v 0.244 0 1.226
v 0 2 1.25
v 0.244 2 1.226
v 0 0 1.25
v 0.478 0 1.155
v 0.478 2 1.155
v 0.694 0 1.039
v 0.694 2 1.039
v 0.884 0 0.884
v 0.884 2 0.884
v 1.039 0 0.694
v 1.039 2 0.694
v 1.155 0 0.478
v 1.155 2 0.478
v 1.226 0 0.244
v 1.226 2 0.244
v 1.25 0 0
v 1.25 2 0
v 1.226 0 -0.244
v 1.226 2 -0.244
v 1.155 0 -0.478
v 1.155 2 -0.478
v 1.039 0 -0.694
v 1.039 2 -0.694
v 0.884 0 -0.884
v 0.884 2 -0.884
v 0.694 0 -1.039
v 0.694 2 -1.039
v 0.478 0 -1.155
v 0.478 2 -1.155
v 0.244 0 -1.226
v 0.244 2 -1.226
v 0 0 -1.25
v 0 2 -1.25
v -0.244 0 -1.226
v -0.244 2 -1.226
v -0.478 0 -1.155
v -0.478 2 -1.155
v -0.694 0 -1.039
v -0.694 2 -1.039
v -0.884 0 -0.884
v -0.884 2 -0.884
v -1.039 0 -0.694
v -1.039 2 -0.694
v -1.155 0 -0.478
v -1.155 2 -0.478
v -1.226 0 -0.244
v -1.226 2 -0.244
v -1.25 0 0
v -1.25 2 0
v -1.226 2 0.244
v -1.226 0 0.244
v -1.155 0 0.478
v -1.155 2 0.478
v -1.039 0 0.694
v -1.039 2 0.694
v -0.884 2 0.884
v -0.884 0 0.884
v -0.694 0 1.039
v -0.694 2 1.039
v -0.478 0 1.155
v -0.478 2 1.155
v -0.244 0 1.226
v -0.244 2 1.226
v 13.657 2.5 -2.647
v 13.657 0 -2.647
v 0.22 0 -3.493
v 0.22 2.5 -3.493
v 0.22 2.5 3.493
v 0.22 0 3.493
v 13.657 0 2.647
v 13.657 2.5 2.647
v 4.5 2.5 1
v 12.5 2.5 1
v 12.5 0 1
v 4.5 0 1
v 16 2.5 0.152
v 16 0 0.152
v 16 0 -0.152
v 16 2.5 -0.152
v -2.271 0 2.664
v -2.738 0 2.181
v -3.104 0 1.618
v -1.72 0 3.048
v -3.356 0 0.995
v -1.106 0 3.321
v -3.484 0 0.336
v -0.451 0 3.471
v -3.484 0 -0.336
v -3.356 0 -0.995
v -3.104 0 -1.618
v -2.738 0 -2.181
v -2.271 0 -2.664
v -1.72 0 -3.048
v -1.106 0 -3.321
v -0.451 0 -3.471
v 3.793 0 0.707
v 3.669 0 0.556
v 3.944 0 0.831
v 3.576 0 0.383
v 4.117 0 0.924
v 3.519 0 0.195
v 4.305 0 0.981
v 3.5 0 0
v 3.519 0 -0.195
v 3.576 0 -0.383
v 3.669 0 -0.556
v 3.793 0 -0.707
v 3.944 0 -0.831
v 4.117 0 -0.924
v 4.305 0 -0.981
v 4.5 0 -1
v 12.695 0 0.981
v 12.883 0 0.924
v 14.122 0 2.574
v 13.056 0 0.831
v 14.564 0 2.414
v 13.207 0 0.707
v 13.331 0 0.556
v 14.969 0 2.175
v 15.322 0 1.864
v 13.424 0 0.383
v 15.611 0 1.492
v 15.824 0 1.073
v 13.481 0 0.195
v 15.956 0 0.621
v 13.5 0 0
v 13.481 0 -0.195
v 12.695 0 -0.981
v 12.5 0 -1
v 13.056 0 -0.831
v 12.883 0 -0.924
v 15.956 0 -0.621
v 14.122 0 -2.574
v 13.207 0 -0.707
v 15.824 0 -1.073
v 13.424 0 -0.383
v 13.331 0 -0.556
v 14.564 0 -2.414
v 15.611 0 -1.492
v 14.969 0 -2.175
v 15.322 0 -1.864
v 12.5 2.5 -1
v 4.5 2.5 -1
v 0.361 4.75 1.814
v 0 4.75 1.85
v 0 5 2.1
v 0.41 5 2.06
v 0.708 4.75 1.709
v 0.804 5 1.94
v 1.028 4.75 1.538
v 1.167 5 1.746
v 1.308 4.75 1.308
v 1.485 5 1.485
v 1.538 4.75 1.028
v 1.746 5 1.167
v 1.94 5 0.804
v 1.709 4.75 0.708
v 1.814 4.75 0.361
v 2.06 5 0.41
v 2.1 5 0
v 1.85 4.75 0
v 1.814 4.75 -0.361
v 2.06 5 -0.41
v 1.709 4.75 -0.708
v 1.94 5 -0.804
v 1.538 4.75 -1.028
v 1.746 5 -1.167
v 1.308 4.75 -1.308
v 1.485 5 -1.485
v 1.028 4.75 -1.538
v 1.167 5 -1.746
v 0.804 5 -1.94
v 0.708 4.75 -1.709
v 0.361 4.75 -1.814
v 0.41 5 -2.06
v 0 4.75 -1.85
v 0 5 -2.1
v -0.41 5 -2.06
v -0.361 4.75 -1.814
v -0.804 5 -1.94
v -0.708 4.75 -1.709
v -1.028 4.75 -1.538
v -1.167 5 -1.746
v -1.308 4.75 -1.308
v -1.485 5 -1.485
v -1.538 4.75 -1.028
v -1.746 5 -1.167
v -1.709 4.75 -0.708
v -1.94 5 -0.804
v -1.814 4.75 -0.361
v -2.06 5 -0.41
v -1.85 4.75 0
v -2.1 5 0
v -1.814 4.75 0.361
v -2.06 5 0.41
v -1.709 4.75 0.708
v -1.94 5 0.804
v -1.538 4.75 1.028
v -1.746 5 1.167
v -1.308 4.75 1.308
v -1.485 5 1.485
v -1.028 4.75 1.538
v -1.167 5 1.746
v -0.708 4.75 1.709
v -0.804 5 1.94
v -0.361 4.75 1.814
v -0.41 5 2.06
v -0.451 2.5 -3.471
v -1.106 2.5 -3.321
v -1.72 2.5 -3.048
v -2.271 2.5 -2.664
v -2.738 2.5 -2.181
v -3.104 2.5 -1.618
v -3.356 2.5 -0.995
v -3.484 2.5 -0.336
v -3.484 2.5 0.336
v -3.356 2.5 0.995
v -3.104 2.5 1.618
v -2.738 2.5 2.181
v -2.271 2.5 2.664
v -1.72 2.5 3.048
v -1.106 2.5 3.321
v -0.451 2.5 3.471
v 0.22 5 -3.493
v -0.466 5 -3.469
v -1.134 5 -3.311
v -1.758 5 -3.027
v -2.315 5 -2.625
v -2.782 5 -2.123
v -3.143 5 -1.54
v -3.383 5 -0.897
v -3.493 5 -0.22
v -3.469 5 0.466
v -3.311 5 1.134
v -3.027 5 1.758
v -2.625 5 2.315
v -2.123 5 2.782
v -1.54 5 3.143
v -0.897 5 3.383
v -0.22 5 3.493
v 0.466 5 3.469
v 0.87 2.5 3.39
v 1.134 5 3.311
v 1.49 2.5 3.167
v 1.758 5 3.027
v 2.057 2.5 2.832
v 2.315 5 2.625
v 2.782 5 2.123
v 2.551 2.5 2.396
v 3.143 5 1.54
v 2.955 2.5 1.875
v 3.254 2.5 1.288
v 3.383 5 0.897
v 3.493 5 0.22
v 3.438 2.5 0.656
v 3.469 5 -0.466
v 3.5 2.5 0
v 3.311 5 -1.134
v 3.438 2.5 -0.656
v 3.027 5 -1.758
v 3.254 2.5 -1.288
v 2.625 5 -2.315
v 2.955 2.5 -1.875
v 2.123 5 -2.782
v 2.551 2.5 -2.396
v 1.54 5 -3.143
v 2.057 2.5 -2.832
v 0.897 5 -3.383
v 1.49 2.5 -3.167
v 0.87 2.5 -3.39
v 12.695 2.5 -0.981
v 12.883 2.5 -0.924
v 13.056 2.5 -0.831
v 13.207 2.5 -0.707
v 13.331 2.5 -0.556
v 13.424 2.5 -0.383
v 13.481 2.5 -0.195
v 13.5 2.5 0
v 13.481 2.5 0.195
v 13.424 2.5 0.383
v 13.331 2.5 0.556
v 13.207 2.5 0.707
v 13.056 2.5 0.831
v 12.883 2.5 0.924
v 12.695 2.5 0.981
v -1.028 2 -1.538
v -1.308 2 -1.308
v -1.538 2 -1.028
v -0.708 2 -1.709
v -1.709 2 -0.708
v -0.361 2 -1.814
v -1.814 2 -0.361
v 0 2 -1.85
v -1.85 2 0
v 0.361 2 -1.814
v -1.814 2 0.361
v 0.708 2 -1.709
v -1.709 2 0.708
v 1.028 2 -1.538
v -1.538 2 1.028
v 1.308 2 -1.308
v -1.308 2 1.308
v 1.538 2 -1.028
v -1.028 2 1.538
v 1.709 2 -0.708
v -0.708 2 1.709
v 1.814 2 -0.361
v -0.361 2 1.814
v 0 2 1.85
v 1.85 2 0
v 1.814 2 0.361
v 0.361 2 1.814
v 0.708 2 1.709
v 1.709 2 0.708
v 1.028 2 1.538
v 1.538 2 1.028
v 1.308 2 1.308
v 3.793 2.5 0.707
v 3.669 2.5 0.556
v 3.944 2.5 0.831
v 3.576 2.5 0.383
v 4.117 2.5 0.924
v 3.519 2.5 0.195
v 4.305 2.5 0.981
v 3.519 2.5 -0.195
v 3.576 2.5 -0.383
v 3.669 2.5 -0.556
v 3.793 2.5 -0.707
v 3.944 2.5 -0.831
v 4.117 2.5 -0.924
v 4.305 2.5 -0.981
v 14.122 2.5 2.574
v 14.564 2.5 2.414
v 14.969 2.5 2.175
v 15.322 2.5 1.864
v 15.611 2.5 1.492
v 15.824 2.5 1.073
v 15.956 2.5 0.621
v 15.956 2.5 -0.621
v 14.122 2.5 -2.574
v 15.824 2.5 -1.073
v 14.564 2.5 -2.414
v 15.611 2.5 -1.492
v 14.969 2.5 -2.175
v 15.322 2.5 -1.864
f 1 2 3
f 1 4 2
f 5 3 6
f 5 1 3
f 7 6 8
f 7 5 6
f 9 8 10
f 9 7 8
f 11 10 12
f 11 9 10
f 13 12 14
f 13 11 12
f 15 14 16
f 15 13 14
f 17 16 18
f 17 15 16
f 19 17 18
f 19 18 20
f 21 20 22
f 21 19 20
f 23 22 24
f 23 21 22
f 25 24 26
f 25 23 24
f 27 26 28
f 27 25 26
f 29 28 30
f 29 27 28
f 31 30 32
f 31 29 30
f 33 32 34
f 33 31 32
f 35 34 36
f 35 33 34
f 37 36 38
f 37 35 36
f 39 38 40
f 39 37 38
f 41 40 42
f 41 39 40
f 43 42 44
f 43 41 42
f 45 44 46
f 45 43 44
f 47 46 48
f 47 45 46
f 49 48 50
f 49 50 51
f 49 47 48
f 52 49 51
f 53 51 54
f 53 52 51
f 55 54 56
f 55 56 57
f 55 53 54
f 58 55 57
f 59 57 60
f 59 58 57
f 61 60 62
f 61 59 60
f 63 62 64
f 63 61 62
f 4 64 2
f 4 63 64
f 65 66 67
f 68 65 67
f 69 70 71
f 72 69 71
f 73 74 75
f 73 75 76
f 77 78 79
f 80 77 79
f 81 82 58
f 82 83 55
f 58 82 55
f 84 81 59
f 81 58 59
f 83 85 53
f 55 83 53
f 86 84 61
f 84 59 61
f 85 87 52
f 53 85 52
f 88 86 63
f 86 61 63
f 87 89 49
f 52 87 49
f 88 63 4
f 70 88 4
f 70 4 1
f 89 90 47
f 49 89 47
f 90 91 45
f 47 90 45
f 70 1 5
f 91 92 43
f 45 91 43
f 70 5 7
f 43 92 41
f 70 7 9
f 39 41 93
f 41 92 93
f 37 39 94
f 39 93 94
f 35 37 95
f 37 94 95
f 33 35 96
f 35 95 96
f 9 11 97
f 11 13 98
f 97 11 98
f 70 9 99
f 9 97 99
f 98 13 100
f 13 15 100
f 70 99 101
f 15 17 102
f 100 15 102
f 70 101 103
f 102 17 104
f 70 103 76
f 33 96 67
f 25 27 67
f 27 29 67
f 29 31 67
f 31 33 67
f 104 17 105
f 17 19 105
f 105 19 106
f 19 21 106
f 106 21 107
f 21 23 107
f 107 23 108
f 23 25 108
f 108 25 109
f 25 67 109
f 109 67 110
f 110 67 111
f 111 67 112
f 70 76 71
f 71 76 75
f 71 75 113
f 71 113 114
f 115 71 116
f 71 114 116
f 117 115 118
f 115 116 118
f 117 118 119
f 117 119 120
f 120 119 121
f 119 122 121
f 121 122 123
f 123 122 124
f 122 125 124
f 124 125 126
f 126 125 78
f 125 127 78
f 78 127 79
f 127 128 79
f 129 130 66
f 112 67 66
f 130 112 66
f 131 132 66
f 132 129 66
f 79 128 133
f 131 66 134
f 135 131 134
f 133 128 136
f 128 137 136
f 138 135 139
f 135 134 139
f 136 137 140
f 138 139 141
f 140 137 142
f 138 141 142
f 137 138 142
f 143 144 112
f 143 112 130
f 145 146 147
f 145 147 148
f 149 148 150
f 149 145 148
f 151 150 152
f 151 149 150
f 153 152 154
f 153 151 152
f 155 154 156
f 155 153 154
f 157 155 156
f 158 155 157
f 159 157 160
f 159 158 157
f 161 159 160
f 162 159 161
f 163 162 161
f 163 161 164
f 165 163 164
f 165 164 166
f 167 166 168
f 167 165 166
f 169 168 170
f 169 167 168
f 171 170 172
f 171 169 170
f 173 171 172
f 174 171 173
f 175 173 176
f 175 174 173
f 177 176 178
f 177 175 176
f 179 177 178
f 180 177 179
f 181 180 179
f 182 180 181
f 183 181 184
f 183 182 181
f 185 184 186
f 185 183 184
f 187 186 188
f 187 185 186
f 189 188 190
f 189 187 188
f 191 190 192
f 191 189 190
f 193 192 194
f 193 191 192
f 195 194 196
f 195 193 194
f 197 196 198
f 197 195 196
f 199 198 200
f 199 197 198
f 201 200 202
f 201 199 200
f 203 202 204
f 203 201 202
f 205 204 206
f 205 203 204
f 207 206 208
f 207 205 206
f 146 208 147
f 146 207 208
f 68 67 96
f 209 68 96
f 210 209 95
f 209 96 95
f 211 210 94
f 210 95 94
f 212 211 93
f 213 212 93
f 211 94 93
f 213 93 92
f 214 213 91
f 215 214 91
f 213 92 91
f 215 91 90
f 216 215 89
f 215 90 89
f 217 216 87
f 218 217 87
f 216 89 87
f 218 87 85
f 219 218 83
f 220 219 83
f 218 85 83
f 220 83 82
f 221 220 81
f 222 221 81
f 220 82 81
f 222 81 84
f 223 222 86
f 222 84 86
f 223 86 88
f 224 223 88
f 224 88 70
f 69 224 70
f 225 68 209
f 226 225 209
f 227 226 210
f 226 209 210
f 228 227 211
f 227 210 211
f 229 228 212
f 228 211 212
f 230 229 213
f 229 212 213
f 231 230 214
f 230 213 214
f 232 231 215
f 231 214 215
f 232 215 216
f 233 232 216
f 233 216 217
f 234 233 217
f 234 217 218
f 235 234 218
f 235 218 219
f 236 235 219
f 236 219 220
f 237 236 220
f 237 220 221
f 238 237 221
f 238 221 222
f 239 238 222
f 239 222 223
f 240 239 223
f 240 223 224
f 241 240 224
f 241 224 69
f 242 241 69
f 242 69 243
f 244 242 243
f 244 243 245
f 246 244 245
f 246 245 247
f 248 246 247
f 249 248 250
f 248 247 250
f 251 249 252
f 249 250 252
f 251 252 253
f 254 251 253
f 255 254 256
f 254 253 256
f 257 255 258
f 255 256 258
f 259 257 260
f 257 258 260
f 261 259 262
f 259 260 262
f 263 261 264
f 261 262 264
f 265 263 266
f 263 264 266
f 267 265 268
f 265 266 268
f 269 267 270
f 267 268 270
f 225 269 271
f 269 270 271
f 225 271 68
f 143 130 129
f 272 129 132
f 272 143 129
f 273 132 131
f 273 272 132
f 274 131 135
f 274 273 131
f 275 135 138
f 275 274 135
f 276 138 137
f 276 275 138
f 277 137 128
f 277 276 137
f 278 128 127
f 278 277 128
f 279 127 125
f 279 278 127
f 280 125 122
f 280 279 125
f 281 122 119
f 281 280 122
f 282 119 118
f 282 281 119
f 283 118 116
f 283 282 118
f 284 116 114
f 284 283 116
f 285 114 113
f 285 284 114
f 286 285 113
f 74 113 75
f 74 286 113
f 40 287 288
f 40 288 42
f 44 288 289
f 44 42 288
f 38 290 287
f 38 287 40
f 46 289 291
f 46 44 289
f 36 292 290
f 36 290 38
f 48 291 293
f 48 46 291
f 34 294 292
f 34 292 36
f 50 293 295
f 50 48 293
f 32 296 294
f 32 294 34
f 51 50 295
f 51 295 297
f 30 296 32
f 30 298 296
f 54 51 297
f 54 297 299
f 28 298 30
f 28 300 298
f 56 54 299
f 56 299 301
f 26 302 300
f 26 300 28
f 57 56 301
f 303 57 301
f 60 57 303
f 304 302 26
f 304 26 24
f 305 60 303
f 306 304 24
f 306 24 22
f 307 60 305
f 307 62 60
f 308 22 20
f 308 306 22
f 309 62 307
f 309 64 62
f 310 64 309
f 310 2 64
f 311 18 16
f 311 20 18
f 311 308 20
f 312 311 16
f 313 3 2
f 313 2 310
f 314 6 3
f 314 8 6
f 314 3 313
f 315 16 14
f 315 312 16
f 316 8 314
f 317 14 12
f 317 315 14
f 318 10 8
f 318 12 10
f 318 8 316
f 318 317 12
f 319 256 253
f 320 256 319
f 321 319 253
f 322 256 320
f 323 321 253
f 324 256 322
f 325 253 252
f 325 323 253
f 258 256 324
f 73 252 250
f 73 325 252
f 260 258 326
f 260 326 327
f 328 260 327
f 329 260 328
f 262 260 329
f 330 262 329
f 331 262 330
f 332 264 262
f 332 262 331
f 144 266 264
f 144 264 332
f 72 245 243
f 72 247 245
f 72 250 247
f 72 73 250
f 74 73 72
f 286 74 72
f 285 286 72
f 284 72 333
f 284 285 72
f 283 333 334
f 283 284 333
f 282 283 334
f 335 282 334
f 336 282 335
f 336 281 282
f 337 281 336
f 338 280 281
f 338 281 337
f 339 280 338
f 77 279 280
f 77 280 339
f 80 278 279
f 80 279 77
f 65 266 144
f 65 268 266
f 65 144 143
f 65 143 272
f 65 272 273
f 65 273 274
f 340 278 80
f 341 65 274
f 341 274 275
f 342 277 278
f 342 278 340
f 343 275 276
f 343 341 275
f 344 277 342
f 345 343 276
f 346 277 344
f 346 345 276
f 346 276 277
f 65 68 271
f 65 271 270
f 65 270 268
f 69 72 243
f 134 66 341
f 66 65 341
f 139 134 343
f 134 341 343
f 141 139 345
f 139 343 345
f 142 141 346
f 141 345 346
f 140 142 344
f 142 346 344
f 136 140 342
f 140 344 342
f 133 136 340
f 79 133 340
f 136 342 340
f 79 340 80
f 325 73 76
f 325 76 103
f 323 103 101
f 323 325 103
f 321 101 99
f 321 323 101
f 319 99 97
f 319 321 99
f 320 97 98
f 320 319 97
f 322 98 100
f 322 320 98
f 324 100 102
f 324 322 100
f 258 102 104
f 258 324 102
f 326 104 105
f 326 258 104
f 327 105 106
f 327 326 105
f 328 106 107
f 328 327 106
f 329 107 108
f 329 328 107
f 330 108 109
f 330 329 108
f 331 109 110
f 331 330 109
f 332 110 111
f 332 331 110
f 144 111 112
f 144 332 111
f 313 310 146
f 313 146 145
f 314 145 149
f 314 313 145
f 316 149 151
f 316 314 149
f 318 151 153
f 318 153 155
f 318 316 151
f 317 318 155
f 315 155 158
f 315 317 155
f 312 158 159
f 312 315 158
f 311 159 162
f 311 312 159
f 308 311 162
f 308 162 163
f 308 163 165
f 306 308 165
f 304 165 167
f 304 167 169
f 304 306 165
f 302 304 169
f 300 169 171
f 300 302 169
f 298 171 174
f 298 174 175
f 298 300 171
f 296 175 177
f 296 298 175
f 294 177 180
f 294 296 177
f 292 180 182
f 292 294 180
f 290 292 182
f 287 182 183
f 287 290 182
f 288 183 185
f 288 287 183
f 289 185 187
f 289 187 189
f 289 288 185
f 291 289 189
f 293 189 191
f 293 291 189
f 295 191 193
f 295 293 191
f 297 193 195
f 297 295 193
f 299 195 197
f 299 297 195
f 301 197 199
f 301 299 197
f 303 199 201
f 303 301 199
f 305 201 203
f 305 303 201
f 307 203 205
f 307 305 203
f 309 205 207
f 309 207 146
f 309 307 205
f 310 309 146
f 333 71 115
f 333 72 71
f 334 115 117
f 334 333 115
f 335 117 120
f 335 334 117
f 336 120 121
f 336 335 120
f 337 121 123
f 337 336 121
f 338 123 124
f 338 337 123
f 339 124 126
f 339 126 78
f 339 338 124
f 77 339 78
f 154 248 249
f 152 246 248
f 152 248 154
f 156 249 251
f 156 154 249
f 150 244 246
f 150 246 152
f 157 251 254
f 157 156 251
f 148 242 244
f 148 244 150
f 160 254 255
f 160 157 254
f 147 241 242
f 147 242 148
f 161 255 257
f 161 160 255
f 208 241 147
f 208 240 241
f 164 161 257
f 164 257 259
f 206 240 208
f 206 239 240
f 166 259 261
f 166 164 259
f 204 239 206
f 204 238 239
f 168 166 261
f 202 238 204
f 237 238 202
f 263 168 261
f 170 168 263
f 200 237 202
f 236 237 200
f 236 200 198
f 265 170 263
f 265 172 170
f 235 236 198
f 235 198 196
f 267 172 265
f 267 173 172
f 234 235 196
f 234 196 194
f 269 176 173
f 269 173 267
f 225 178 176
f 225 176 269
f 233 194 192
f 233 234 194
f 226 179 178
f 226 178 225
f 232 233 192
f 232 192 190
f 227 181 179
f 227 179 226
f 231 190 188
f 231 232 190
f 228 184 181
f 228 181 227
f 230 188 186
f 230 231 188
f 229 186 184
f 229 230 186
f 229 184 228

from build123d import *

# Parameters (mm, degrees)
SKETCH1_R           = 1.25
BOSS_EXTRUDE1_DEPTH = 2.5
SKETCH2_R           = 3.5
SKETCH2_R_2         = 1.25
BOSS_EXTRUDE2_DEPTH = 2.5
CUT_EXTRUDE1_START  = -3
SKETCH3_R           = 1.85
SKETCH3_R_2         = 1.25
CUT_EXTRUDE1_DEPTH  = 3
CHAMFER1_SIZE       = 0.25
CUT_EXTRUDE2_DEPTH  = 3
FILLET1_R           = 2.5


with BuildPart() as part:
    # Sketch1 → Boss-Extrude1 (new body)
    with BuildSketch(Plane(origin=(0, 0, 0), x_dir=(1, 0, 0), z_dir=(0, 1, 0))):
        with BuildLine():
            ThreePointArc((0.219829752, 3.49308959), (-3.5, 0), (0.219829752, -3.49308959))
            Line((0.219829752, -3.49308959), (16, -2.5))
            Line((16, -2.5), (16, 2.5))
            Line((16, 2.5), (0.219829752, 3.49308959))
        make_face()
        with Locations(Location((0, 0, 0), (0, 0, 270))):
            Circle(SKETCH1_R, mode=Mode.SUBTRACT)
    extrude(amount=BOSS_EXTRUDE1_DEPTH)

    # Sketch2 → Boss-Extrude2 (add)
    with BuildSketch(Plane(origin=(0, 2.5, 0), x_dir=(1, 0, 0), z_dir=(0, 1, 0))):
        with Locations(Location((0, 0, 0), (0, 0, 86.398967731))):
            Circle(SKETCH2_R)
        with Locations(Location((0, 0, 0), (0, 0, 270))):
            Circle(SKETCH2_R_2, mode=Mode.SUBTRACT)
    extrude(amount=BOSS_EXTRUDE2_DEPTH)

    # Sketch3 → Cut-Extrude1 (cut)
    with BuildSketch(Plane(origin=(0, 5, 0), x_dir=(1, 0, 0), z_dir=(0, 1, 0)).offset(CUT_EXTRUDE1_START)):
        with Locations(Location((0, 0, 0), (0, 0, 270))):
            Circle(SKETCH3_R)
        with Locations(Location((0, 0, 0), (0, 0, 270))):
            Circle(SKETCH3_R_2, mode=Mode.SUBTRACT)
    extrude(amount=CUT_EXTRUDE1_DEPTH, mode=Mode.SUBTRACT)

    # Chamfer1
    chamfer1_edges = [part.edges().sort_by_distance(p)[0] for p in [
        (0, 5, -1.85),
    ]]
    chamfer(chamfer1_edges, length=CHAMFER1_SIZE)

    # Sketch4 → Cut-Extrude2 (cut)
    with BuildSketch(Plane(origin=(0, 2.5, 0), x_dir=(1, 0, 0), z_dir=(0, 1, 0))):
        with BuildLine():
            Line((4.5, 1), (12.5, 1))
            ThreePointArc((12.5, 1), (13.5, 0), (12.5, -1))
            Line((12.5, -1), (4.5, -1))
            ThreePointArc((4.5, -1), (3.5, 0), (4.5, 1))
        make_face()
    extrude(amount=-CUT_EXTRUDE2_DEPTH, mode=Mode.SUBTRACT)

    # Fillet1
    fillet1_edges = [part.edges().sort_by_distance(p)[0] for p in [
        (16, 1.25, -2.5),
        (16, 1.25, 2.5),
    ]]
    fillet(fillet1_edges, radius=FILLET1_R)


solid = part.part
